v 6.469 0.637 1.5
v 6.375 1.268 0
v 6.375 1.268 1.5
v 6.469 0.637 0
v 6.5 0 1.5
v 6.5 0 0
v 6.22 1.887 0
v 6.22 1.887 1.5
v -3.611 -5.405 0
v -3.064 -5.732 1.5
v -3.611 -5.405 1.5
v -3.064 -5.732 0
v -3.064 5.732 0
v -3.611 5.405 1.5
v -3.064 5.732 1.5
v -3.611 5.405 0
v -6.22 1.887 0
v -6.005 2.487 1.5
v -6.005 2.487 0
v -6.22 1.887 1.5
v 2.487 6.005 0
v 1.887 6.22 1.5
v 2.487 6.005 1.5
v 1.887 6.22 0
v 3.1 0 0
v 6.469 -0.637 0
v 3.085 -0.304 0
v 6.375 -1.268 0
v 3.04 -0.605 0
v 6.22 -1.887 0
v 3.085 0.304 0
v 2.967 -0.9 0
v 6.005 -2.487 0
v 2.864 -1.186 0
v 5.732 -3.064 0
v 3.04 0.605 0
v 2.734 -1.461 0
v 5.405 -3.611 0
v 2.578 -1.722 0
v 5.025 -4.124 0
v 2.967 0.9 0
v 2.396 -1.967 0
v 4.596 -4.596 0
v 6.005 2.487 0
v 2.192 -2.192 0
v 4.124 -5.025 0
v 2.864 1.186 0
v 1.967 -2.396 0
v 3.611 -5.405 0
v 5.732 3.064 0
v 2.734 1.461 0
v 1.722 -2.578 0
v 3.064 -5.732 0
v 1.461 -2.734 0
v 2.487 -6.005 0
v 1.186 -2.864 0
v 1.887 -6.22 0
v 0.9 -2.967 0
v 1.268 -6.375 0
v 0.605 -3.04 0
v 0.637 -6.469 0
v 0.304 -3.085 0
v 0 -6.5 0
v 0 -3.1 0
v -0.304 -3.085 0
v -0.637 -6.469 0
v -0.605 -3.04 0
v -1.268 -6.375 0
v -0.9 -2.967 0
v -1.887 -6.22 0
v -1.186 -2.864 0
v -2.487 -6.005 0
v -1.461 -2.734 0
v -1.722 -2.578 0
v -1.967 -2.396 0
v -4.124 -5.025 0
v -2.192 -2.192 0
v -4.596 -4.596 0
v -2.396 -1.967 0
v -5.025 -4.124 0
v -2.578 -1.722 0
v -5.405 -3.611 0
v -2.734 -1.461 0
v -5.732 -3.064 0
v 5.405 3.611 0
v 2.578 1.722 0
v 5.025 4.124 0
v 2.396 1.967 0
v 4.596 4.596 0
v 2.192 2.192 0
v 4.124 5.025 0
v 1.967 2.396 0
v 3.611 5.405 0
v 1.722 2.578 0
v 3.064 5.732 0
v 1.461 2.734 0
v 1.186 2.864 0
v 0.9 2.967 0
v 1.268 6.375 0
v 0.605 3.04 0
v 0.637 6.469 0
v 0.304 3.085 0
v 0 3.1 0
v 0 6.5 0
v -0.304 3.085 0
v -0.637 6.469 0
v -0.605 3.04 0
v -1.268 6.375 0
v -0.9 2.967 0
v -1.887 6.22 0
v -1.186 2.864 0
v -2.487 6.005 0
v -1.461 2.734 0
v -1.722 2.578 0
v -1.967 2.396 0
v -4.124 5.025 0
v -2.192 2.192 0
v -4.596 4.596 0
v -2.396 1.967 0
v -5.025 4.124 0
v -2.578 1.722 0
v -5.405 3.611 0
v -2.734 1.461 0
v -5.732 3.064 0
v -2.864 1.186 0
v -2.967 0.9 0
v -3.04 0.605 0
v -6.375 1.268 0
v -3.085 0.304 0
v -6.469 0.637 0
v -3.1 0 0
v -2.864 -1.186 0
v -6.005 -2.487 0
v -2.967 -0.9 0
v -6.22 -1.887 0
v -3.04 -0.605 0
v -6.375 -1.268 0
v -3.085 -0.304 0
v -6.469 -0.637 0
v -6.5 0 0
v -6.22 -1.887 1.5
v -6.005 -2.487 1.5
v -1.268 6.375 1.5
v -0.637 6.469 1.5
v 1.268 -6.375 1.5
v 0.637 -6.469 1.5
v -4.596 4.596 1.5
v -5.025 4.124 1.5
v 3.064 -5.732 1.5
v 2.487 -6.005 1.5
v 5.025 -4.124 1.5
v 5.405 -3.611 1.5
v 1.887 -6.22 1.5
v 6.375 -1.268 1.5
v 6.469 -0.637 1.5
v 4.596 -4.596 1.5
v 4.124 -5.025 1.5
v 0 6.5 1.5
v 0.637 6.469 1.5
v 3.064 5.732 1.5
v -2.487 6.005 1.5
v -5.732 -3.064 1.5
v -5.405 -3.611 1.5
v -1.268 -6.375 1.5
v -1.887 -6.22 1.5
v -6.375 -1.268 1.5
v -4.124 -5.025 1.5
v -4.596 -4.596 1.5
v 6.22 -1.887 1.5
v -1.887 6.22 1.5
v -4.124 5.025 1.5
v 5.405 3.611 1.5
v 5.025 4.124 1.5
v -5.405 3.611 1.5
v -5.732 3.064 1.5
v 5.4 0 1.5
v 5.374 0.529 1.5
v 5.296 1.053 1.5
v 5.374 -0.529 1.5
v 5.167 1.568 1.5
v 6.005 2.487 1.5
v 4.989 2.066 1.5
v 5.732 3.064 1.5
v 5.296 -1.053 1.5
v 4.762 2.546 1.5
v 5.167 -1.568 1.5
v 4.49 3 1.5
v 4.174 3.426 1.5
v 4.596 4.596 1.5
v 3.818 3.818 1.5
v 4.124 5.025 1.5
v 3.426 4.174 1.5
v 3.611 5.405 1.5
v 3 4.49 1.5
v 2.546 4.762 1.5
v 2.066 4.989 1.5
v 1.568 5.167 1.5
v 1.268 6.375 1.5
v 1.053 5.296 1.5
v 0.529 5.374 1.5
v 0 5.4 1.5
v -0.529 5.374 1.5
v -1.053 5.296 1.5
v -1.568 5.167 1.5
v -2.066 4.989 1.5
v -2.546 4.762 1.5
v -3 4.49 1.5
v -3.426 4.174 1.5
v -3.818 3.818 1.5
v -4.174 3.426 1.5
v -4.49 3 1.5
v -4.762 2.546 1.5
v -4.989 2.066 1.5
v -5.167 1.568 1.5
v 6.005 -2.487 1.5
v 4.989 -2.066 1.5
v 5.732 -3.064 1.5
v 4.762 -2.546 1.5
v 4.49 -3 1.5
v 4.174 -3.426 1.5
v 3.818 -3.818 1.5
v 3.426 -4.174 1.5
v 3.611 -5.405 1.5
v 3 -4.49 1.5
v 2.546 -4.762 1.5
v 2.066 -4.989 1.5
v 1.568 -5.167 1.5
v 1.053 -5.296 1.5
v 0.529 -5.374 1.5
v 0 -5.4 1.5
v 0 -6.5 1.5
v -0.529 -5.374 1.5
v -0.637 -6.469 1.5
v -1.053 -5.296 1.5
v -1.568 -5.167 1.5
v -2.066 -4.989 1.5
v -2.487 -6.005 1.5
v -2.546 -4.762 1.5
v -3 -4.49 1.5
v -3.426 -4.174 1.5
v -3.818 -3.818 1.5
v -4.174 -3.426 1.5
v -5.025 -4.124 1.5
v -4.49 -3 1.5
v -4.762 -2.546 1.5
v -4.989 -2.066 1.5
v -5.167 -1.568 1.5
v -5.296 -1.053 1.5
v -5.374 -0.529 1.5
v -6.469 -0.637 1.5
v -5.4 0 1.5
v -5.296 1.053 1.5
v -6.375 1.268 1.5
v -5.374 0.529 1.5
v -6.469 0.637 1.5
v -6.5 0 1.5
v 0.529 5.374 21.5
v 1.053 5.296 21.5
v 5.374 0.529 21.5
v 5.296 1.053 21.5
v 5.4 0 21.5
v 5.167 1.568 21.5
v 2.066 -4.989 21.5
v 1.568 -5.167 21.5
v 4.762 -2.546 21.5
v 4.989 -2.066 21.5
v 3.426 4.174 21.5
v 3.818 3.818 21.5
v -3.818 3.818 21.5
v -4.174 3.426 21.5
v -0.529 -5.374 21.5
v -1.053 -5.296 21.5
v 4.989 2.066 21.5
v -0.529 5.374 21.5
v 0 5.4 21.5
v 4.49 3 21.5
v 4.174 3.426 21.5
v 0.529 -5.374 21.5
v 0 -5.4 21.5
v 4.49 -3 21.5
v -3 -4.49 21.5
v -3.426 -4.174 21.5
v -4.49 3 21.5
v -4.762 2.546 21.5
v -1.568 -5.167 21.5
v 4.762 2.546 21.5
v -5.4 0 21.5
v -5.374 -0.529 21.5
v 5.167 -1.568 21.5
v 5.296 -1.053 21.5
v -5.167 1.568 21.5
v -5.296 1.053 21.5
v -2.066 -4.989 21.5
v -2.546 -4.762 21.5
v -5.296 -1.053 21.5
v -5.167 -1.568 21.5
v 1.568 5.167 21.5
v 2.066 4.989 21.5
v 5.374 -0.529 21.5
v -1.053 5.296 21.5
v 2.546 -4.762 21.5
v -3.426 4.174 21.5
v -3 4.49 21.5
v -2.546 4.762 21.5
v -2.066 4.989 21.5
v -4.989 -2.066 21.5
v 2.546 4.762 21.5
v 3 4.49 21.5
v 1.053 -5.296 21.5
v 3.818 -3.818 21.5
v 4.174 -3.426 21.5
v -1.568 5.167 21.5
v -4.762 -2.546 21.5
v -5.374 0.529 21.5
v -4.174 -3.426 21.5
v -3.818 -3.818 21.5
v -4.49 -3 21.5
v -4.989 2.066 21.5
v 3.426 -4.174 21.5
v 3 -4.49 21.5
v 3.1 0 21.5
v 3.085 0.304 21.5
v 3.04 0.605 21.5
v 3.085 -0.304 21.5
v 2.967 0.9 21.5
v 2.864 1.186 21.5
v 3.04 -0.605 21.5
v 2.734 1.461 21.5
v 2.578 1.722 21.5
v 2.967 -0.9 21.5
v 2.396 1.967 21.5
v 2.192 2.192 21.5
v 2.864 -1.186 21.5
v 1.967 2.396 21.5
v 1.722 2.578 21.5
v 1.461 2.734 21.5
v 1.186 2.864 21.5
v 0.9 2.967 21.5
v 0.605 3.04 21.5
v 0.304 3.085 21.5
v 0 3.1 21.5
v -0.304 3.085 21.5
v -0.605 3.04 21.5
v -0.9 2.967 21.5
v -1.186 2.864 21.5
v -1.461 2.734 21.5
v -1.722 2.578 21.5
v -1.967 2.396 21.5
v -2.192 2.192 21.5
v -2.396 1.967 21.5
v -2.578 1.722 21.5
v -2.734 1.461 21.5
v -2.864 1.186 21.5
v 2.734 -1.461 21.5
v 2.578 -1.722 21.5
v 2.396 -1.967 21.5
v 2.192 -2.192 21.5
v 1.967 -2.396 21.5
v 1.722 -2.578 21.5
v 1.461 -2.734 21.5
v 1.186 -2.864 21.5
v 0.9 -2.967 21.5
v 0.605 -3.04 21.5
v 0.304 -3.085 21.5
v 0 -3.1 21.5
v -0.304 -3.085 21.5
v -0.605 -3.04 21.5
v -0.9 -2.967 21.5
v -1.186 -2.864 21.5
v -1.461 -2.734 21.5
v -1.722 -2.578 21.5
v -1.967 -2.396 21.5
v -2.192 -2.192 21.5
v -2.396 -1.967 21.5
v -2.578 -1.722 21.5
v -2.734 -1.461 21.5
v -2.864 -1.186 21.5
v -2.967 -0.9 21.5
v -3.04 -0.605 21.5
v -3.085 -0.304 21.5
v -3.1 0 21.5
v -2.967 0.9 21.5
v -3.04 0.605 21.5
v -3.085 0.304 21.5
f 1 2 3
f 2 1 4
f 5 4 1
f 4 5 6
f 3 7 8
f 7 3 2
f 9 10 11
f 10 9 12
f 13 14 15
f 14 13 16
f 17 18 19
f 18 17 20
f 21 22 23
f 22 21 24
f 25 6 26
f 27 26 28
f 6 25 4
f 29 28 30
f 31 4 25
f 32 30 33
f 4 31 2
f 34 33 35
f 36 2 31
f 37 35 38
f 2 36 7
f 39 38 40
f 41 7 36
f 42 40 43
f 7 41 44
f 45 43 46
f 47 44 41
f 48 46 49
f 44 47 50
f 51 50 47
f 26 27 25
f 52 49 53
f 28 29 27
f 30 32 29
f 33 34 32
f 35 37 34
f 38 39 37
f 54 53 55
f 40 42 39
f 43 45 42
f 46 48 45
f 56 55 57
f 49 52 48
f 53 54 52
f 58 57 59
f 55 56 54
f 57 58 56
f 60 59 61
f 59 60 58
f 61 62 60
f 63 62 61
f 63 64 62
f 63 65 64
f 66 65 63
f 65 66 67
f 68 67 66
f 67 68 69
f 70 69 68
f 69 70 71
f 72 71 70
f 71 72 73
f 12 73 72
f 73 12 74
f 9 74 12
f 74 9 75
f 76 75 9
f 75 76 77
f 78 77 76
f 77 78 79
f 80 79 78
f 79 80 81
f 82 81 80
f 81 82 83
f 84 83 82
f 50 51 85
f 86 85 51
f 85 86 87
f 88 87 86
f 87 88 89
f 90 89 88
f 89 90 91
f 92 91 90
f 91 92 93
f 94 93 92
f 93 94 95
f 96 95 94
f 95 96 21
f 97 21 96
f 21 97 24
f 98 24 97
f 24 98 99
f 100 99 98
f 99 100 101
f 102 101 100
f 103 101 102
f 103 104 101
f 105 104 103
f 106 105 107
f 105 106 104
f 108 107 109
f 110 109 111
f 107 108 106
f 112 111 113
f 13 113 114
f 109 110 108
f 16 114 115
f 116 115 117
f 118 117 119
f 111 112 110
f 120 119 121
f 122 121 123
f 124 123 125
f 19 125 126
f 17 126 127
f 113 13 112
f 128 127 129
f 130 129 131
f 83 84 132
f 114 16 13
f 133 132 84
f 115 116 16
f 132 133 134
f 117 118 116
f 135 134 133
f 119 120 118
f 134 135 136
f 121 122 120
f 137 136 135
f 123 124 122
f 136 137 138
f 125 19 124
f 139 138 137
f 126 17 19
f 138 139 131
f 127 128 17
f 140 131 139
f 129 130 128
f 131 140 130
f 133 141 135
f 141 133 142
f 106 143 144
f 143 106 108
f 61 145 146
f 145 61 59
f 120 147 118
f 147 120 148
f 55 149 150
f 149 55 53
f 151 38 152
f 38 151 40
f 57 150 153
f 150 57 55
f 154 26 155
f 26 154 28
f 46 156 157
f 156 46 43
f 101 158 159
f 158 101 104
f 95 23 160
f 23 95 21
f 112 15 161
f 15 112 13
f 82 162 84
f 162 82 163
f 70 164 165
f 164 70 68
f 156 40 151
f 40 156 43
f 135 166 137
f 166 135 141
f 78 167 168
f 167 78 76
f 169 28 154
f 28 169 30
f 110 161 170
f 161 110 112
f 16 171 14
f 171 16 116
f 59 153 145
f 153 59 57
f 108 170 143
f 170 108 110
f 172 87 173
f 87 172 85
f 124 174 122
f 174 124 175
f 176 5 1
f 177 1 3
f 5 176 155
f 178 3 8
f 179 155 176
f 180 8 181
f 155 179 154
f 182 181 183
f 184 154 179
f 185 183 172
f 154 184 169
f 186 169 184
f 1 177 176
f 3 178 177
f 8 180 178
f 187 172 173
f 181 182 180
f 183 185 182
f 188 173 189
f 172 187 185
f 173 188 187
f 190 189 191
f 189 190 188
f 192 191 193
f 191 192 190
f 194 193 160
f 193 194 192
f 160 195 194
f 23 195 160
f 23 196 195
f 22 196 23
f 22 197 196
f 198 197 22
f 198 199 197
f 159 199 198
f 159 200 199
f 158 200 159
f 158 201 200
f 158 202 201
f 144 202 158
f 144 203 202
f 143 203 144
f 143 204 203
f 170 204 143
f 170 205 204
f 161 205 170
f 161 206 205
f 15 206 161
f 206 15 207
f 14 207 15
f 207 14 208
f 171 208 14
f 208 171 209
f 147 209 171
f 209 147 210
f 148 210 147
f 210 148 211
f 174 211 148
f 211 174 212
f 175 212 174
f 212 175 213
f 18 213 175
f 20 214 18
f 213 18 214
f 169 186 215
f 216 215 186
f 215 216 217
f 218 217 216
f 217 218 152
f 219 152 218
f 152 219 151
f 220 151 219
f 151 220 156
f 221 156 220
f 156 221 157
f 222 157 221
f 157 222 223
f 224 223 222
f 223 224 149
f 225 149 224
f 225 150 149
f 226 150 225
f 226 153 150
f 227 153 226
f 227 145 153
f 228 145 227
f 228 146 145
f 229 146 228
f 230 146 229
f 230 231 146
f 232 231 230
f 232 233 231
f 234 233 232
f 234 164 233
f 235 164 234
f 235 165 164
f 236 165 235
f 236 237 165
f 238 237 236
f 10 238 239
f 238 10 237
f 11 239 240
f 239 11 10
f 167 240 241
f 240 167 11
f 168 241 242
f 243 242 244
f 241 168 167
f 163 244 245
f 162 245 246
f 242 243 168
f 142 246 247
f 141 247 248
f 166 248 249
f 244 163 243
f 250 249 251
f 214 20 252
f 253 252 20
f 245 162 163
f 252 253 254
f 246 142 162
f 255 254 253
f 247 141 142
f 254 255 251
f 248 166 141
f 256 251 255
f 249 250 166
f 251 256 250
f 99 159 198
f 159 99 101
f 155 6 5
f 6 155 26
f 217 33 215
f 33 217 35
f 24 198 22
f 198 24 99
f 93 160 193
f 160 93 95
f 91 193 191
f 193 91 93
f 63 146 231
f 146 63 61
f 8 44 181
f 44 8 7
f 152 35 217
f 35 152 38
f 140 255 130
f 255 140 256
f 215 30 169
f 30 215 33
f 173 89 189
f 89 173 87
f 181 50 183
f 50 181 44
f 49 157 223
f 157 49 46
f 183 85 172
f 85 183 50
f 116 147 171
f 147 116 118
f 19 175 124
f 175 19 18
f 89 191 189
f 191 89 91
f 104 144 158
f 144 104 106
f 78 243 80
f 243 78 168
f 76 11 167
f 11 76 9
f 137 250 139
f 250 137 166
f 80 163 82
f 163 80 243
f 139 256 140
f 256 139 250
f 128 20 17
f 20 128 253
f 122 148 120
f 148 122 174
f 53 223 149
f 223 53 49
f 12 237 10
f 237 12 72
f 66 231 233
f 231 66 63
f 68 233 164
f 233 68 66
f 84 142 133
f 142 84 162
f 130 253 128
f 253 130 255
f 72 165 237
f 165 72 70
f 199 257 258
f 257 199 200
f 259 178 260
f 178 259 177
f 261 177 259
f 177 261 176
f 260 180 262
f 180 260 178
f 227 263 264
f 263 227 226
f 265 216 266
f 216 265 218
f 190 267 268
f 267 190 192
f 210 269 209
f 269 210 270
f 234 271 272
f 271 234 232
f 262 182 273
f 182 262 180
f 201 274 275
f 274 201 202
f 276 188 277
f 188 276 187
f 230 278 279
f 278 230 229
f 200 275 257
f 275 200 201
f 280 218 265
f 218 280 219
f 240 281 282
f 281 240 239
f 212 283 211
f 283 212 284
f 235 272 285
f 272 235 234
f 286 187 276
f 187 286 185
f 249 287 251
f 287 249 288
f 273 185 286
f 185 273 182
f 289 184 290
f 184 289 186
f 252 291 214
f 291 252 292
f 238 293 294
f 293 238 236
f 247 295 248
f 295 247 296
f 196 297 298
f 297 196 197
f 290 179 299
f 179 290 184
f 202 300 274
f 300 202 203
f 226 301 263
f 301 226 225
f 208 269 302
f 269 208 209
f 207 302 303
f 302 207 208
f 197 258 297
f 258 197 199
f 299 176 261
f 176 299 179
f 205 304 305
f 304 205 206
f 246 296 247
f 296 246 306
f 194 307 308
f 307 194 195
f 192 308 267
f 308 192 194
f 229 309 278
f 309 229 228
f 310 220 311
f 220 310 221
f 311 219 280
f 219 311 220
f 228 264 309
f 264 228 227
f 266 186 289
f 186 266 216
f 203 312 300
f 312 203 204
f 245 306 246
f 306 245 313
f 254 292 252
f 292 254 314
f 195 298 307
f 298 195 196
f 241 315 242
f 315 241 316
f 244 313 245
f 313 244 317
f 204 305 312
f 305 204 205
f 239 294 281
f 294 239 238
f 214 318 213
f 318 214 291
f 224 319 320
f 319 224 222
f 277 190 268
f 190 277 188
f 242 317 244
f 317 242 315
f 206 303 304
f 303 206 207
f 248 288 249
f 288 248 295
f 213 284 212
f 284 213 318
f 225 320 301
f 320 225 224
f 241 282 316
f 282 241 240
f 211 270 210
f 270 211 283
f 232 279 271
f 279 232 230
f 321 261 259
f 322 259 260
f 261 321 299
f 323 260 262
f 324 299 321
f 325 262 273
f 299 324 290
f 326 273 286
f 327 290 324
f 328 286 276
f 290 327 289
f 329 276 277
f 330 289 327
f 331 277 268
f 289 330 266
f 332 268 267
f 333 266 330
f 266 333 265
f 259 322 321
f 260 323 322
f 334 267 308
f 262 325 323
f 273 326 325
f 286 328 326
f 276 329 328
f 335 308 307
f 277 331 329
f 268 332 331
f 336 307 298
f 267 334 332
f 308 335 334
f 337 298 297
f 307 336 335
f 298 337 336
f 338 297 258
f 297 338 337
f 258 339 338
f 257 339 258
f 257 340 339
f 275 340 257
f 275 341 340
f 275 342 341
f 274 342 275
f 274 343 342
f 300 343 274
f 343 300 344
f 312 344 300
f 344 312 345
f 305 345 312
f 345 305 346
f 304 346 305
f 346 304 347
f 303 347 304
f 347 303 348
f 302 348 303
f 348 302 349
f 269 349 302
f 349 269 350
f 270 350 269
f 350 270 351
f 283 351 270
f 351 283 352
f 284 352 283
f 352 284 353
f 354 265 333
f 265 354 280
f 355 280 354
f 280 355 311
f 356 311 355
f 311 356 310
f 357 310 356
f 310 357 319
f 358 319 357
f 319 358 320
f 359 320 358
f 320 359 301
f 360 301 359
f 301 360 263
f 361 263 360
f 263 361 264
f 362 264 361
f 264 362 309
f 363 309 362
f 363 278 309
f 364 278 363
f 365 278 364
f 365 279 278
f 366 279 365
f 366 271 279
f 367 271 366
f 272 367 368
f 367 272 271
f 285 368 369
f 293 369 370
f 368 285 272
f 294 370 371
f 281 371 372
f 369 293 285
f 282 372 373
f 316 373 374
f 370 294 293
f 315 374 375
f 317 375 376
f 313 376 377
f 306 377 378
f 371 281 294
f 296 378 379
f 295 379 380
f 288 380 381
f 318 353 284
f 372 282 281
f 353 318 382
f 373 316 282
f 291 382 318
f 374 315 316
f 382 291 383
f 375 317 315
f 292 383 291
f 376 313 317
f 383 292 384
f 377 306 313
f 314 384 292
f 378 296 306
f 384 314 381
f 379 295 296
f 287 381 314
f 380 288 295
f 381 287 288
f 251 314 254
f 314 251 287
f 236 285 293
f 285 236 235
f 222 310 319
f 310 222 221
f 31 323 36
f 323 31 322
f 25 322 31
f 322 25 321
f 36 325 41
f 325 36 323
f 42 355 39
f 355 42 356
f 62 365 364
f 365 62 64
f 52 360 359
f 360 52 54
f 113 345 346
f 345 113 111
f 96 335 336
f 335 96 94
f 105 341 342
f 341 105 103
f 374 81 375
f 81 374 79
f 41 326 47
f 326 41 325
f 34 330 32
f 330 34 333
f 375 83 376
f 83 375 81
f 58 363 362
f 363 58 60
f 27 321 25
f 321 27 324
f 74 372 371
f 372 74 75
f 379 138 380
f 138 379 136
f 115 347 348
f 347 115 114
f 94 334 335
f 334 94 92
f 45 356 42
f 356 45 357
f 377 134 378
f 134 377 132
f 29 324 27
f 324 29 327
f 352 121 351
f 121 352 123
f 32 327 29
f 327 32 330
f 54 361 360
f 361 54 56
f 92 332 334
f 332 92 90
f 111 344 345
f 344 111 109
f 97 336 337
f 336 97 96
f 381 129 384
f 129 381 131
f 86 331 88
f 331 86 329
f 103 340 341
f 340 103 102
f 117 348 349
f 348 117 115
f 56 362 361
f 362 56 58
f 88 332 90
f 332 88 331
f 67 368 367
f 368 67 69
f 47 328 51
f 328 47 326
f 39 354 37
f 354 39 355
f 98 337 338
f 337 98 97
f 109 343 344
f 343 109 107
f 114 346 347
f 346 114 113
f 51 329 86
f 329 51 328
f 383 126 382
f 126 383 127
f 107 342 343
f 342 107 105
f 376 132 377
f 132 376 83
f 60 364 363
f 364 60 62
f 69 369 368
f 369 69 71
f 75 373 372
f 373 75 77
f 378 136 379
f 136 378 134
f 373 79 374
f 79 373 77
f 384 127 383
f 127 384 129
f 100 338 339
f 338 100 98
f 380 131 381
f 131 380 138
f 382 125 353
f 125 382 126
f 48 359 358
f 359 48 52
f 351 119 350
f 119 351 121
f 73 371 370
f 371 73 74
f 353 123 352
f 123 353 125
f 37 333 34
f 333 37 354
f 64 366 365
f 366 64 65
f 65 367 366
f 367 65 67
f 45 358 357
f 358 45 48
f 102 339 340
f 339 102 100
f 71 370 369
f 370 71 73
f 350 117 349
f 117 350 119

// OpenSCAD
// Adapter arm for 0.2 mL PCR tube into 1.5 mL tube socket
// Print orientation: collar at z=0, arm extends to z=21.5

// Dimensions in millimetres
collar_od = 13;        // Outer diameter of base collar
collar_h = 1.5;        // Height of base collar (z = 0 to 1.5)
arm_od = 10.8;         // Outer diameter of arm body
arm_z_start = 1.5;     // Z position where arm body starts
total_h = 21.5;        // Total height of part
hole_d = 6.2;          // Diameter of through-hole

$fn = 64;

difference() {
    union() {
        // Base collar at z = 0 to 1.5
        cylinder(d = collar_od, h = collar_h, center = false);
        
        // Arm body from z = 1.5 to 21.5
        translate([0, 0, arm_z_start]) {
            cylinder(d = arm_od, h = total_h - arm_z_start, center = false);
        }
    }
    
    // Through-hole going through entire height (open both ends)
    translate([0, 0, -0.05]) {
        cylinder(d = hole_d, h = total_h + 0.1, center = false);
    }
}
